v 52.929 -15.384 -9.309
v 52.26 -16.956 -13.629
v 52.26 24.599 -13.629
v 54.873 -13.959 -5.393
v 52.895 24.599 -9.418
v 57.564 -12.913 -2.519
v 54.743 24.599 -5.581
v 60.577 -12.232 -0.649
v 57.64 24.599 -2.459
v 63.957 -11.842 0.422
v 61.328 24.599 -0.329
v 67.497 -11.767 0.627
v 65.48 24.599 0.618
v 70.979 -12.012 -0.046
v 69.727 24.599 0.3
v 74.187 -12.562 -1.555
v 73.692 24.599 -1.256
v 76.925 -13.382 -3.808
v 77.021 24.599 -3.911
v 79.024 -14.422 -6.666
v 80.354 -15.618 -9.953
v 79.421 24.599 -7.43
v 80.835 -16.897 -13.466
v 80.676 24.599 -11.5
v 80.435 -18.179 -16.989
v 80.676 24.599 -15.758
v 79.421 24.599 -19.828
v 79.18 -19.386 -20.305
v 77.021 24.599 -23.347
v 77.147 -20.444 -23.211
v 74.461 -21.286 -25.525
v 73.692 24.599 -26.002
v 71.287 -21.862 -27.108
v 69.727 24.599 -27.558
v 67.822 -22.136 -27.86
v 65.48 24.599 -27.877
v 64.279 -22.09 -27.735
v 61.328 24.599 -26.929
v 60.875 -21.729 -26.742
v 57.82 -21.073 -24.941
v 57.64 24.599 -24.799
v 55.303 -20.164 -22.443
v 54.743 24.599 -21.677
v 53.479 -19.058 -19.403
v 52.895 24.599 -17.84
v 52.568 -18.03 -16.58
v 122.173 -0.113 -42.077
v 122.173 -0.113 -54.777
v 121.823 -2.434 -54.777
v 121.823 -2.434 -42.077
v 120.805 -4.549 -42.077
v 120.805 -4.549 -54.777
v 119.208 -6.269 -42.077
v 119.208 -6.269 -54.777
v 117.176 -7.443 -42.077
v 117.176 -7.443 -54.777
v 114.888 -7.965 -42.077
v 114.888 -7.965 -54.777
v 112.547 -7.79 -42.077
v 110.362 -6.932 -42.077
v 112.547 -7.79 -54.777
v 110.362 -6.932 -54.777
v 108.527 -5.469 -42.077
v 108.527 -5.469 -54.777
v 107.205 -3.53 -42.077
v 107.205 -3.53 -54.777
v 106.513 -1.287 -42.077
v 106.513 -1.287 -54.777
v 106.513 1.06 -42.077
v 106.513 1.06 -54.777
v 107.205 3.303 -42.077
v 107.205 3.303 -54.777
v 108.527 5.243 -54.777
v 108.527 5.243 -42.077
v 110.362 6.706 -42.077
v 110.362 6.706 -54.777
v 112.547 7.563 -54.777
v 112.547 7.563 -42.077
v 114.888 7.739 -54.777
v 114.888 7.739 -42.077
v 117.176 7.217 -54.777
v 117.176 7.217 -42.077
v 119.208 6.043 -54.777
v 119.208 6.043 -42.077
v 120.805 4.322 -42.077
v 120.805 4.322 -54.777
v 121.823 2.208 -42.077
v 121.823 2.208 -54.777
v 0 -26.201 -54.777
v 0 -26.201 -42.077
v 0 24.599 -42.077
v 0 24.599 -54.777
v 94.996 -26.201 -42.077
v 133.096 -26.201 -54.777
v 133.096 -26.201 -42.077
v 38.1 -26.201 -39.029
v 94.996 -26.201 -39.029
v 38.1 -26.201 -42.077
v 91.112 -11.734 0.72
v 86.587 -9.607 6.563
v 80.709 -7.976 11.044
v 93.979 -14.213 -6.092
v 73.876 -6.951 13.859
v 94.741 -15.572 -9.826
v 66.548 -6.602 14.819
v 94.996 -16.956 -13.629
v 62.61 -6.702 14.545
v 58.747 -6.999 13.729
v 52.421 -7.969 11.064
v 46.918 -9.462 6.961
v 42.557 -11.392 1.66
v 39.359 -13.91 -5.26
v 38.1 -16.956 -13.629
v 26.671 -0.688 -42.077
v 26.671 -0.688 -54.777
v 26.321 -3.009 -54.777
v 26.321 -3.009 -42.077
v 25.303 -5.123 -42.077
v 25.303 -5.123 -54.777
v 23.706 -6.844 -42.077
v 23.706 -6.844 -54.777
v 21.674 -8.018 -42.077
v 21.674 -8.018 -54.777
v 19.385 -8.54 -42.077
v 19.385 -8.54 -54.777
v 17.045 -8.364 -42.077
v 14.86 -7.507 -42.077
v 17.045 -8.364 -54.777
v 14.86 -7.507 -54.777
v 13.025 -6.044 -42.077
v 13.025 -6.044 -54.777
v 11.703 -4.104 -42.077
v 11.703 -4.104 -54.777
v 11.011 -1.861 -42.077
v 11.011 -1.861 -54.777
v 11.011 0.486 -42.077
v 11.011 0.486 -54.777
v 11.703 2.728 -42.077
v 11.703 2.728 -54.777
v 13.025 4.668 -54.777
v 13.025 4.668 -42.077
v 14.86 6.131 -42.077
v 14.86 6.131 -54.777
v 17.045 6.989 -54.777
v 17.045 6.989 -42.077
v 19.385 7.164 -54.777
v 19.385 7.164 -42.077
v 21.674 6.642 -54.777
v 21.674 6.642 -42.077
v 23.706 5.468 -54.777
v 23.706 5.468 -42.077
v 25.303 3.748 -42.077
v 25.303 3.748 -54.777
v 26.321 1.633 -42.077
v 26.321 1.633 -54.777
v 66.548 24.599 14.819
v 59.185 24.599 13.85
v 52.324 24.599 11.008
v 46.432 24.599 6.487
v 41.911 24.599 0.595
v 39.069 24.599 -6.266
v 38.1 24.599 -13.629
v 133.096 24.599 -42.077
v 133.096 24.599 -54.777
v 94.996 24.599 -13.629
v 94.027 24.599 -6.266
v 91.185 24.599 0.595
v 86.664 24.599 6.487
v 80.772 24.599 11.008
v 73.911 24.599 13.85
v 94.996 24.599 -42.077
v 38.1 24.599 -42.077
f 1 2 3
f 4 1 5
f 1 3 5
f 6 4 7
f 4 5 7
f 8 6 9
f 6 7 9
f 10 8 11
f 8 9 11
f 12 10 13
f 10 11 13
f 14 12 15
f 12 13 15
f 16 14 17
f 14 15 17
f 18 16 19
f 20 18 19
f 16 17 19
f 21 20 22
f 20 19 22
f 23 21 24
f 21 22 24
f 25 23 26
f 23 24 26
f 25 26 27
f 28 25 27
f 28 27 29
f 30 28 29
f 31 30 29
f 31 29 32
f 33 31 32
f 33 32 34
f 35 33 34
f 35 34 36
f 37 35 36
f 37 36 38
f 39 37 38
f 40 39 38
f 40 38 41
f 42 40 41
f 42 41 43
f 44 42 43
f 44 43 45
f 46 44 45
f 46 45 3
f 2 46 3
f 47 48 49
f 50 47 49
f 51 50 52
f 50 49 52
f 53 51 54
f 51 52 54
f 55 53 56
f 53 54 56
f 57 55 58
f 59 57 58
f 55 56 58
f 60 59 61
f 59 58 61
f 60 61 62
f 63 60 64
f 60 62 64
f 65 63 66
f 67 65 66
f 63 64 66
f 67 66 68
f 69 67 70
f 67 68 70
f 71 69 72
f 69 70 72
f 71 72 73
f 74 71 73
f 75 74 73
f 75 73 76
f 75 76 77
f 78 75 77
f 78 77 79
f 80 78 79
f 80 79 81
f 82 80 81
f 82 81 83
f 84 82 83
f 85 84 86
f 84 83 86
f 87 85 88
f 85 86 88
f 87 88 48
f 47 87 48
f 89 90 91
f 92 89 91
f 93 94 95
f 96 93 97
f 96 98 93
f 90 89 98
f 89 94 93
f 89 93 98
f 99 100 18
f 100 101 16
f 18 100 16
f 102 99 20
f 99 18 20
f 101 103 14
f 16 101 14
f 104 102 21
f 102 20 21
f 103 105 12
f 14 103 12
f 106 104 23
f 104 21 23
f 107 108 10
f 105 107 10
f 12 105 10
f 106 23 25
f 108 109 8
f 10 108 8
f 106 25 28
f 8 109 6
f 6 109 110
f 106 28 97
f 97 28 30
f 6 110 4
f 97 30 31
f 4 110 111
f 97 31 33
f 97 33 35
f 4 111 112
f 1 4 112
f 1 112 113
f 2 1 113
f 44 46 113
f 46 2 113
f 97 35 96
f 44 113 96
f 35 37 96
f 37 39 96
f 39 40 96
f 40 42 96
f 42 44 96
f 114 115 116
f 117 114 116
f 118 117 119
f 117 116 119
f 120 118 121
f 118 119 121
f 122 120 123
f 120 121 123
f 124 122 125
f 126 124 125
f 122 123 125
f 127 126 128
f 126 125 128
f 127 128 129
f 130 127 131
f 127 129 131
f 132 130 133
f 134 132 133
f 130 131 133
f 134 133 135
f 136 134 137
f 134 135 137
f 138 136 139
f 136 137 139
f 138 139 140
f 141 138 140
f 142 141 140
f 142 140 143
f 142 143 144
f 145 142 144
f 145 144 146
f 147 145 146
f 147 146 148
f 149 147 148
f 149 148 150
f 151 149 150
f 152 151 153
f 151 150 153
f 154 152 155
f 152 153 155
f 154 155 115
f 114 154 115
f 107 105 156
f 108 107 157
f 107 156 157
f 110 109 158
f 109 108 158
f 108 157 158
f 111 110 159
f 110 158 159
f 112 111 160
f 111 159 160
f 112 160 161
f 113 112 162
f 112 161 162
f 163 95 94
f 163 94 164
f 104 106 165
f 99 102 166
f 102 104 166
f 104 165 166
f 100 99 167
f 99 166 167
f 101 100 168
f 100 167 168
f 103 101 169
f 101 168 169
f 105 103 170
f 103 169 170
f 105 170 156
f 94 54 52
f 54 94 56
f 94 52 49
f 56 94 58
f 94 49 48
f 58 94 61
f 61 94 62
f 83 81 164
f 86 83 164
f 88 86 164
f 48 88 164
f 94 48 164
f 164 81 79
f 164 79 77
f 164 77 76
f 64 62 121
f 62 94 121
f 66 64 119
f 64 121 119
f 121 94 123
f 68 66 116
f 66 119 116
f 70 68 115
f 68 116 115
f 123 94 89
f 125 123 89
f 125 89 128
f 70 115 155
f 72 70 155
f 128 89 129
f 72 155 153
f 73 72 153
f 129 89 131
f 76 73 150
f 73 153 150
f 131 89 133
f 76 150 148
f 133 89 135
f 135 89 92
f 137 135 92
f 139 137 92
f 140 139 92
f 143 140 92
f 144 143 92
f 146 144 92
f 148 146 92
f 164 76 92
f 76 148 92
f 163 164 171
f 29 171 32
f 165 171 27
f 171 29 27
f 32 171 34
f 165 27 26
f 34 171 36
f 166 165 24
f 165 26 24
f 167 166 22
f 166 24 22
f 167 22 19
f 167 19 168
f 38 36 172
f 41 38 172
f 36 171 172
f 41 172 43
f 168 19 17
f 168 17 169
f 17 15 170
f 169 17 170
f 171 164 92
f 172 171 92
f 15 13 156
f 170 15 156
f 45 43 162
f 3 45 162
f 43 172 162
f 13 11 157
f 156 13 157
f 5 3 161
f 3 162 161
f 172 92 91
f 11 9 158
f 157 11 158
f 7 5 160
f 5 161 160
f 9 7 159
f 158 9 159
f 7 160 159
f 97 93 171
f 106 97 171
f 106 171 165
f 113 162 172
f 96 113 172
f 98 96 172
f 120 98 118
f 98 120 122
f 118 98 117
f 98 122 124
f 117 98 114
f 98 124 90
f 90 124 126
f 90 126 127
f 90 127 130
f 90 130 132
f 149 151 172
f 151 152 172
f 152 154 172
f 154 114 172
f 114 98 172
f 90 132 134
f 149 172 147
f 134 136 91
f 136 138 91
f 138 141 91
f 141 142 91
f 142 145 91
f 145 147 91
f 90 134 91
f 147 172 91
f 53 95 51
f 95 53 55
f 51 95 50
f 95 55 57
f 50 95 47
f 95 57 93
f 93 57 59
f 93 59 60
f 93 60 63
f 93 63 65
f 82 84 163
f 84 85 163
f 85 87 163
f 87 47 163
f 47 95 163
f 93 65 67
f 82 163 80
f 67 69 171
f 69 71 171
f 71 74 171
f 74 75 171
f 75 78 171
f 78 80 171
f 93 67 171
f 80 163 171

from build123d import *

# Parameters (mm, degrees)
F0_W     = 50.8
F0_H     = 15.748
F1_DEPTH = 133.096
F2_R     = 14.2875
F3_DEPTH = 50.8
F4_R     = 7.874
F5_DEPTH = 12.7


with BuildPart() as f1:
    # F0 (on Right) → F1 (new body)
    with BuildSketch(Plane.YZ):
        Polygon((24.598954, 14.818944), (-6.601977, 14.818944), (-26.201046, -39.029056), (24.598954, -39.029056), align=None)
        with Locations((-0.801046, -46.903056)):
            Rectangle(F0_W, F0_H)
    extrude(amount=F1_DEPTH)

    # F2 (on face) → F3 (cut)
    with BuildSketch(Plane(origin=(0, 24.598954, 0), x_dir=(-1, 0, 0), z_dir=(0, 1, 0))):
        with BuildLine():
            Line((-133.096, 14.818944), (-133.096, -42.077056))
            Line((-133.096, -42.077056), (-94.996, -42.077056))
            Line((-94.996, -42.077056), (-94.996, -13.629056))
            ThreePointArc((-94.996, -13.629056), (-86.663774, 6.486718), (-66.548, 14.818944))
            Line((-66.548, 14.818944), (-133.096, 14.818944))
        make_face()
        with BuildLine():
            Line((-38.1, -42.077056), (0, -42.077056))
            Line((0, -42.077056), (0, 14.818944))
            Line((0, 14.818944), (-66.548, 14.818944))
            ThreePointArc((-66.548, 14.818944), (-46.432226, 6.486718), (-38.1, -13.629056))
            Line((-38.1, -13.629056), (-38.1, -42.077056))
        make_face()
        with Locations((-66.548, -13.629056)):
            Circle(F2_R)
    extrude(amount=-F3_DEPTH, mode=Mode.SUBTRACT)

    # F4 (on face) → F5 (cut)
    with BuildSketch(Plane(origin=(0, 0, -54.777056), x_dir=(1, 0, 0), z_dir=(0, 0, -1))):
        with Locations((18.796865, 0.687916)):
            Circle(F4_R)
        with Locations((114.299135, 0.11313)):
            Circle(F4_R)
    extrude(amount=-F5_DEPTH, mode=Mode.SUBTRACT)


solid = f1.part
